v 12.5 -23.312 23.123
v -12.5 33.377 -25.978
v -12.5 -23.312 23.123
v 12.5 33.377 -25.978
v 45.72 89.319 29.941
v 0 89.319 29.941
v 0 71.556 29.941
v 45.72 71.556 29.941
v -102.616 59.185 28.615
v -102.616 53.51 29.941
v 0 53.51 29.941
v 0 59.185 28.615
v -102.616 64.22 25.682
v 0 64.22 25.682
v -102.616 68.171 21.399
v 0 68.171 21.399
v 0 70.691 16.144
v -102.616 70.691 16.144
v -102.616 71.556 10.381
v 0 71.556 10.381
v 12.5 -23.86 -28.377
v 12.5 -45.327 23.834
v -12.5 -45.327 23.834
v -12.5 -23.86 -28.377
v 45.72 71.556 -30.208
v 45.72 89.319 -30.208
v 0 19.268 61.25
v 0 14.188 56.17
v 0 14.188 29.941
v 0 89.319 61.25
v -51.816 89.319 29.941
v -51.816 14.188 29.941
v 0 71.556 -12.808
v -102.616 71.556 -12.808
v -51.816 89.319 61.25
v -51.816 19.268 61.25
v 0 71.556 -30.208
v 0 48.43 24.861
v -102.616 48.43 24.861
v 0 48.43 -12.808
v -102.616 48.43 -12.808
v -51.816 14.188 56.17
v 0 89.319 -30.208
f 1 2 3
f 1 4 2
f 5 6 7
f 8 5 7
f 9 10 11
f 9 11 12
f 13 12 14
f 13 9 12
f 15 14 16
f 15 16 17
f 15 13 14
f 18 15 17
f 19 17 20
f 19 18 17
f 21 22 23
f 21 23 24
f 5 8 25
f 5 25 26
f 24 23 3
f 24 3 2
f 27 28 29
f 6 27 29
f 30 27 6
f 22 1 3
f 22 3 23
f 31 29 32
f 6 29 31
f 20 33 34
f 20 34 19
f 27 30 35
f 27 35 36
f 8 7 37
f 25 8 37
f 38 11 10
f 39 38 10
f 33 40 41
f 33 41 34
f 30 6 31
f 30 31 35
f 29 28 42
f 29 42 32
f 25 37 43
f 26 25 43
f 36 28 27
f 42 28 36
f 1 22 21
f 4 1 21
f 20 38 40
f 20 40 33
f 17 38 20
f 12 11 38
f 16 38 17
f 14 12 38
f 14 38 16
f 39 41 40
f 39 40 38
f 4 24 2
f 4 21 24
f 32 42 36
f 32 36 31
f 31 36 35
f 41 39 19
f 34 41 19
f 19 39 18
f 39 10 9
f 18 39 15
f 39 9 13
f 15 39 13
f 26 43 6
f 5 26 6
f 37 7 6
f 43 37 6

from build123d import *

# Parameters (mm, degrees)
F0_W        = 23.1258124113
F0_H        = 42.7482295781
F1_DEPTH    = 102.616
F2_DEPTH    = 51.816
F3_DEPTH    = 45.72
F4_SIZE     = 5.08
F4_2_SIZE   = 5.08
F5_T1_DEPTH = 200.4123170871
F7_DEPTH    = 12.5


# Not quite as in the source:
# - a fillet or chamfer that OpenCascade refuses, or shapes differently, is made with other operations: its cross-section is extruded or revolved along the edge and cut away or added
# - a feature of the source that left no trace in its solid (it failed there, or was rolled back) is left out


with BuildPart() as f1:
    # F0 (on Right) → F1 (new body)
    with BuildSketch(Plane.YZ):
        with Locations((59.9930435419, 8.5665853694)):
            Rectangle(F0_W, F0_H)
    extrude(amount=-F1_DEPTH)

    # F4
    f4_edges = [f1.edges().sort_by_distance(p)[0] for p in [
        (-51.308, 48.430137, 29.9407),
    ]]
    chamfer(f4_edges, length=F4_SIZE)

    # F5: fillet of radius 19.622727835 on 1 edges, made by hand

    # F5_s2 → F5_t1 (cut)
    with BuildSketch(Plane.YZ.offset(-151.5141585435)):
        with BuildLine():
            ThreePointArc((53.5101373363, 29.9407001585), (66.355337393, 23.687601957), (71.5559497476, 10.3814367411))
            Line((71.5559497476, 10.3814367411), (71.5559497476, 29.9407001585))
            Line((71.5559497476, 29.9407001585), (53.5101373363, 29.9407001585))
        make_face()
    extrude(amount=F5_T1_DEPTH, mode=Mode.SUBTRACT)


with BuildPart() as f2:
    # F0 (on Right) → F2 (new body)
    with BuildSketch(Plane.YZ):
        Polygon((89.3192514777, 29.9407001585), (89.3192514777, 61.2500272691), (14.1880903393, 61.2500272691), (14.1880903393, 29.9407001585), (48.4301373363, 29.9407001585), (71.5559497476, 29.9407001585), align=None)
    extrude(amount=-F2_DEPTH)

    # F4#2
    f4_2_edges = [f2.edges().sort_by_distance(p)[0] for p in [
        (-25.908, 14.18809, 61.250027),
    ]]
    chamfer(f4_2_edges, length=F4_2_SIZE)


with BuildPart() as f3:
    # F0 (on Right) → F3 (new body)
    with BuildSketch(Plane.YZ):
        Polygon((89.3192514777, -30.2083920687), (89.3192514777, 29.9407001585), (71.5559497476, 29.9407001585), (71.5559497476, -12.8075294197), (71.5559497476, -30.2083920687), align=None)
    extrude(amount=F3_DEPTH)


with BuildPart() as f7:
    # F0 (on Right) → F7 (new body, symmetric)
    with BuildSketch(Plane.YZ):
        Polygon((33.377405256, -25.9779412299), (-23.3115255833, 23.1231357902), (-45.3274697065, 23.8340292126), (-23.8601844758, -28.3768214285), align=None)
    extrude(amount=F7_DEPTH, both=True)


solid = Compound([f1.part, f2.part, f3.part, f7.part])
